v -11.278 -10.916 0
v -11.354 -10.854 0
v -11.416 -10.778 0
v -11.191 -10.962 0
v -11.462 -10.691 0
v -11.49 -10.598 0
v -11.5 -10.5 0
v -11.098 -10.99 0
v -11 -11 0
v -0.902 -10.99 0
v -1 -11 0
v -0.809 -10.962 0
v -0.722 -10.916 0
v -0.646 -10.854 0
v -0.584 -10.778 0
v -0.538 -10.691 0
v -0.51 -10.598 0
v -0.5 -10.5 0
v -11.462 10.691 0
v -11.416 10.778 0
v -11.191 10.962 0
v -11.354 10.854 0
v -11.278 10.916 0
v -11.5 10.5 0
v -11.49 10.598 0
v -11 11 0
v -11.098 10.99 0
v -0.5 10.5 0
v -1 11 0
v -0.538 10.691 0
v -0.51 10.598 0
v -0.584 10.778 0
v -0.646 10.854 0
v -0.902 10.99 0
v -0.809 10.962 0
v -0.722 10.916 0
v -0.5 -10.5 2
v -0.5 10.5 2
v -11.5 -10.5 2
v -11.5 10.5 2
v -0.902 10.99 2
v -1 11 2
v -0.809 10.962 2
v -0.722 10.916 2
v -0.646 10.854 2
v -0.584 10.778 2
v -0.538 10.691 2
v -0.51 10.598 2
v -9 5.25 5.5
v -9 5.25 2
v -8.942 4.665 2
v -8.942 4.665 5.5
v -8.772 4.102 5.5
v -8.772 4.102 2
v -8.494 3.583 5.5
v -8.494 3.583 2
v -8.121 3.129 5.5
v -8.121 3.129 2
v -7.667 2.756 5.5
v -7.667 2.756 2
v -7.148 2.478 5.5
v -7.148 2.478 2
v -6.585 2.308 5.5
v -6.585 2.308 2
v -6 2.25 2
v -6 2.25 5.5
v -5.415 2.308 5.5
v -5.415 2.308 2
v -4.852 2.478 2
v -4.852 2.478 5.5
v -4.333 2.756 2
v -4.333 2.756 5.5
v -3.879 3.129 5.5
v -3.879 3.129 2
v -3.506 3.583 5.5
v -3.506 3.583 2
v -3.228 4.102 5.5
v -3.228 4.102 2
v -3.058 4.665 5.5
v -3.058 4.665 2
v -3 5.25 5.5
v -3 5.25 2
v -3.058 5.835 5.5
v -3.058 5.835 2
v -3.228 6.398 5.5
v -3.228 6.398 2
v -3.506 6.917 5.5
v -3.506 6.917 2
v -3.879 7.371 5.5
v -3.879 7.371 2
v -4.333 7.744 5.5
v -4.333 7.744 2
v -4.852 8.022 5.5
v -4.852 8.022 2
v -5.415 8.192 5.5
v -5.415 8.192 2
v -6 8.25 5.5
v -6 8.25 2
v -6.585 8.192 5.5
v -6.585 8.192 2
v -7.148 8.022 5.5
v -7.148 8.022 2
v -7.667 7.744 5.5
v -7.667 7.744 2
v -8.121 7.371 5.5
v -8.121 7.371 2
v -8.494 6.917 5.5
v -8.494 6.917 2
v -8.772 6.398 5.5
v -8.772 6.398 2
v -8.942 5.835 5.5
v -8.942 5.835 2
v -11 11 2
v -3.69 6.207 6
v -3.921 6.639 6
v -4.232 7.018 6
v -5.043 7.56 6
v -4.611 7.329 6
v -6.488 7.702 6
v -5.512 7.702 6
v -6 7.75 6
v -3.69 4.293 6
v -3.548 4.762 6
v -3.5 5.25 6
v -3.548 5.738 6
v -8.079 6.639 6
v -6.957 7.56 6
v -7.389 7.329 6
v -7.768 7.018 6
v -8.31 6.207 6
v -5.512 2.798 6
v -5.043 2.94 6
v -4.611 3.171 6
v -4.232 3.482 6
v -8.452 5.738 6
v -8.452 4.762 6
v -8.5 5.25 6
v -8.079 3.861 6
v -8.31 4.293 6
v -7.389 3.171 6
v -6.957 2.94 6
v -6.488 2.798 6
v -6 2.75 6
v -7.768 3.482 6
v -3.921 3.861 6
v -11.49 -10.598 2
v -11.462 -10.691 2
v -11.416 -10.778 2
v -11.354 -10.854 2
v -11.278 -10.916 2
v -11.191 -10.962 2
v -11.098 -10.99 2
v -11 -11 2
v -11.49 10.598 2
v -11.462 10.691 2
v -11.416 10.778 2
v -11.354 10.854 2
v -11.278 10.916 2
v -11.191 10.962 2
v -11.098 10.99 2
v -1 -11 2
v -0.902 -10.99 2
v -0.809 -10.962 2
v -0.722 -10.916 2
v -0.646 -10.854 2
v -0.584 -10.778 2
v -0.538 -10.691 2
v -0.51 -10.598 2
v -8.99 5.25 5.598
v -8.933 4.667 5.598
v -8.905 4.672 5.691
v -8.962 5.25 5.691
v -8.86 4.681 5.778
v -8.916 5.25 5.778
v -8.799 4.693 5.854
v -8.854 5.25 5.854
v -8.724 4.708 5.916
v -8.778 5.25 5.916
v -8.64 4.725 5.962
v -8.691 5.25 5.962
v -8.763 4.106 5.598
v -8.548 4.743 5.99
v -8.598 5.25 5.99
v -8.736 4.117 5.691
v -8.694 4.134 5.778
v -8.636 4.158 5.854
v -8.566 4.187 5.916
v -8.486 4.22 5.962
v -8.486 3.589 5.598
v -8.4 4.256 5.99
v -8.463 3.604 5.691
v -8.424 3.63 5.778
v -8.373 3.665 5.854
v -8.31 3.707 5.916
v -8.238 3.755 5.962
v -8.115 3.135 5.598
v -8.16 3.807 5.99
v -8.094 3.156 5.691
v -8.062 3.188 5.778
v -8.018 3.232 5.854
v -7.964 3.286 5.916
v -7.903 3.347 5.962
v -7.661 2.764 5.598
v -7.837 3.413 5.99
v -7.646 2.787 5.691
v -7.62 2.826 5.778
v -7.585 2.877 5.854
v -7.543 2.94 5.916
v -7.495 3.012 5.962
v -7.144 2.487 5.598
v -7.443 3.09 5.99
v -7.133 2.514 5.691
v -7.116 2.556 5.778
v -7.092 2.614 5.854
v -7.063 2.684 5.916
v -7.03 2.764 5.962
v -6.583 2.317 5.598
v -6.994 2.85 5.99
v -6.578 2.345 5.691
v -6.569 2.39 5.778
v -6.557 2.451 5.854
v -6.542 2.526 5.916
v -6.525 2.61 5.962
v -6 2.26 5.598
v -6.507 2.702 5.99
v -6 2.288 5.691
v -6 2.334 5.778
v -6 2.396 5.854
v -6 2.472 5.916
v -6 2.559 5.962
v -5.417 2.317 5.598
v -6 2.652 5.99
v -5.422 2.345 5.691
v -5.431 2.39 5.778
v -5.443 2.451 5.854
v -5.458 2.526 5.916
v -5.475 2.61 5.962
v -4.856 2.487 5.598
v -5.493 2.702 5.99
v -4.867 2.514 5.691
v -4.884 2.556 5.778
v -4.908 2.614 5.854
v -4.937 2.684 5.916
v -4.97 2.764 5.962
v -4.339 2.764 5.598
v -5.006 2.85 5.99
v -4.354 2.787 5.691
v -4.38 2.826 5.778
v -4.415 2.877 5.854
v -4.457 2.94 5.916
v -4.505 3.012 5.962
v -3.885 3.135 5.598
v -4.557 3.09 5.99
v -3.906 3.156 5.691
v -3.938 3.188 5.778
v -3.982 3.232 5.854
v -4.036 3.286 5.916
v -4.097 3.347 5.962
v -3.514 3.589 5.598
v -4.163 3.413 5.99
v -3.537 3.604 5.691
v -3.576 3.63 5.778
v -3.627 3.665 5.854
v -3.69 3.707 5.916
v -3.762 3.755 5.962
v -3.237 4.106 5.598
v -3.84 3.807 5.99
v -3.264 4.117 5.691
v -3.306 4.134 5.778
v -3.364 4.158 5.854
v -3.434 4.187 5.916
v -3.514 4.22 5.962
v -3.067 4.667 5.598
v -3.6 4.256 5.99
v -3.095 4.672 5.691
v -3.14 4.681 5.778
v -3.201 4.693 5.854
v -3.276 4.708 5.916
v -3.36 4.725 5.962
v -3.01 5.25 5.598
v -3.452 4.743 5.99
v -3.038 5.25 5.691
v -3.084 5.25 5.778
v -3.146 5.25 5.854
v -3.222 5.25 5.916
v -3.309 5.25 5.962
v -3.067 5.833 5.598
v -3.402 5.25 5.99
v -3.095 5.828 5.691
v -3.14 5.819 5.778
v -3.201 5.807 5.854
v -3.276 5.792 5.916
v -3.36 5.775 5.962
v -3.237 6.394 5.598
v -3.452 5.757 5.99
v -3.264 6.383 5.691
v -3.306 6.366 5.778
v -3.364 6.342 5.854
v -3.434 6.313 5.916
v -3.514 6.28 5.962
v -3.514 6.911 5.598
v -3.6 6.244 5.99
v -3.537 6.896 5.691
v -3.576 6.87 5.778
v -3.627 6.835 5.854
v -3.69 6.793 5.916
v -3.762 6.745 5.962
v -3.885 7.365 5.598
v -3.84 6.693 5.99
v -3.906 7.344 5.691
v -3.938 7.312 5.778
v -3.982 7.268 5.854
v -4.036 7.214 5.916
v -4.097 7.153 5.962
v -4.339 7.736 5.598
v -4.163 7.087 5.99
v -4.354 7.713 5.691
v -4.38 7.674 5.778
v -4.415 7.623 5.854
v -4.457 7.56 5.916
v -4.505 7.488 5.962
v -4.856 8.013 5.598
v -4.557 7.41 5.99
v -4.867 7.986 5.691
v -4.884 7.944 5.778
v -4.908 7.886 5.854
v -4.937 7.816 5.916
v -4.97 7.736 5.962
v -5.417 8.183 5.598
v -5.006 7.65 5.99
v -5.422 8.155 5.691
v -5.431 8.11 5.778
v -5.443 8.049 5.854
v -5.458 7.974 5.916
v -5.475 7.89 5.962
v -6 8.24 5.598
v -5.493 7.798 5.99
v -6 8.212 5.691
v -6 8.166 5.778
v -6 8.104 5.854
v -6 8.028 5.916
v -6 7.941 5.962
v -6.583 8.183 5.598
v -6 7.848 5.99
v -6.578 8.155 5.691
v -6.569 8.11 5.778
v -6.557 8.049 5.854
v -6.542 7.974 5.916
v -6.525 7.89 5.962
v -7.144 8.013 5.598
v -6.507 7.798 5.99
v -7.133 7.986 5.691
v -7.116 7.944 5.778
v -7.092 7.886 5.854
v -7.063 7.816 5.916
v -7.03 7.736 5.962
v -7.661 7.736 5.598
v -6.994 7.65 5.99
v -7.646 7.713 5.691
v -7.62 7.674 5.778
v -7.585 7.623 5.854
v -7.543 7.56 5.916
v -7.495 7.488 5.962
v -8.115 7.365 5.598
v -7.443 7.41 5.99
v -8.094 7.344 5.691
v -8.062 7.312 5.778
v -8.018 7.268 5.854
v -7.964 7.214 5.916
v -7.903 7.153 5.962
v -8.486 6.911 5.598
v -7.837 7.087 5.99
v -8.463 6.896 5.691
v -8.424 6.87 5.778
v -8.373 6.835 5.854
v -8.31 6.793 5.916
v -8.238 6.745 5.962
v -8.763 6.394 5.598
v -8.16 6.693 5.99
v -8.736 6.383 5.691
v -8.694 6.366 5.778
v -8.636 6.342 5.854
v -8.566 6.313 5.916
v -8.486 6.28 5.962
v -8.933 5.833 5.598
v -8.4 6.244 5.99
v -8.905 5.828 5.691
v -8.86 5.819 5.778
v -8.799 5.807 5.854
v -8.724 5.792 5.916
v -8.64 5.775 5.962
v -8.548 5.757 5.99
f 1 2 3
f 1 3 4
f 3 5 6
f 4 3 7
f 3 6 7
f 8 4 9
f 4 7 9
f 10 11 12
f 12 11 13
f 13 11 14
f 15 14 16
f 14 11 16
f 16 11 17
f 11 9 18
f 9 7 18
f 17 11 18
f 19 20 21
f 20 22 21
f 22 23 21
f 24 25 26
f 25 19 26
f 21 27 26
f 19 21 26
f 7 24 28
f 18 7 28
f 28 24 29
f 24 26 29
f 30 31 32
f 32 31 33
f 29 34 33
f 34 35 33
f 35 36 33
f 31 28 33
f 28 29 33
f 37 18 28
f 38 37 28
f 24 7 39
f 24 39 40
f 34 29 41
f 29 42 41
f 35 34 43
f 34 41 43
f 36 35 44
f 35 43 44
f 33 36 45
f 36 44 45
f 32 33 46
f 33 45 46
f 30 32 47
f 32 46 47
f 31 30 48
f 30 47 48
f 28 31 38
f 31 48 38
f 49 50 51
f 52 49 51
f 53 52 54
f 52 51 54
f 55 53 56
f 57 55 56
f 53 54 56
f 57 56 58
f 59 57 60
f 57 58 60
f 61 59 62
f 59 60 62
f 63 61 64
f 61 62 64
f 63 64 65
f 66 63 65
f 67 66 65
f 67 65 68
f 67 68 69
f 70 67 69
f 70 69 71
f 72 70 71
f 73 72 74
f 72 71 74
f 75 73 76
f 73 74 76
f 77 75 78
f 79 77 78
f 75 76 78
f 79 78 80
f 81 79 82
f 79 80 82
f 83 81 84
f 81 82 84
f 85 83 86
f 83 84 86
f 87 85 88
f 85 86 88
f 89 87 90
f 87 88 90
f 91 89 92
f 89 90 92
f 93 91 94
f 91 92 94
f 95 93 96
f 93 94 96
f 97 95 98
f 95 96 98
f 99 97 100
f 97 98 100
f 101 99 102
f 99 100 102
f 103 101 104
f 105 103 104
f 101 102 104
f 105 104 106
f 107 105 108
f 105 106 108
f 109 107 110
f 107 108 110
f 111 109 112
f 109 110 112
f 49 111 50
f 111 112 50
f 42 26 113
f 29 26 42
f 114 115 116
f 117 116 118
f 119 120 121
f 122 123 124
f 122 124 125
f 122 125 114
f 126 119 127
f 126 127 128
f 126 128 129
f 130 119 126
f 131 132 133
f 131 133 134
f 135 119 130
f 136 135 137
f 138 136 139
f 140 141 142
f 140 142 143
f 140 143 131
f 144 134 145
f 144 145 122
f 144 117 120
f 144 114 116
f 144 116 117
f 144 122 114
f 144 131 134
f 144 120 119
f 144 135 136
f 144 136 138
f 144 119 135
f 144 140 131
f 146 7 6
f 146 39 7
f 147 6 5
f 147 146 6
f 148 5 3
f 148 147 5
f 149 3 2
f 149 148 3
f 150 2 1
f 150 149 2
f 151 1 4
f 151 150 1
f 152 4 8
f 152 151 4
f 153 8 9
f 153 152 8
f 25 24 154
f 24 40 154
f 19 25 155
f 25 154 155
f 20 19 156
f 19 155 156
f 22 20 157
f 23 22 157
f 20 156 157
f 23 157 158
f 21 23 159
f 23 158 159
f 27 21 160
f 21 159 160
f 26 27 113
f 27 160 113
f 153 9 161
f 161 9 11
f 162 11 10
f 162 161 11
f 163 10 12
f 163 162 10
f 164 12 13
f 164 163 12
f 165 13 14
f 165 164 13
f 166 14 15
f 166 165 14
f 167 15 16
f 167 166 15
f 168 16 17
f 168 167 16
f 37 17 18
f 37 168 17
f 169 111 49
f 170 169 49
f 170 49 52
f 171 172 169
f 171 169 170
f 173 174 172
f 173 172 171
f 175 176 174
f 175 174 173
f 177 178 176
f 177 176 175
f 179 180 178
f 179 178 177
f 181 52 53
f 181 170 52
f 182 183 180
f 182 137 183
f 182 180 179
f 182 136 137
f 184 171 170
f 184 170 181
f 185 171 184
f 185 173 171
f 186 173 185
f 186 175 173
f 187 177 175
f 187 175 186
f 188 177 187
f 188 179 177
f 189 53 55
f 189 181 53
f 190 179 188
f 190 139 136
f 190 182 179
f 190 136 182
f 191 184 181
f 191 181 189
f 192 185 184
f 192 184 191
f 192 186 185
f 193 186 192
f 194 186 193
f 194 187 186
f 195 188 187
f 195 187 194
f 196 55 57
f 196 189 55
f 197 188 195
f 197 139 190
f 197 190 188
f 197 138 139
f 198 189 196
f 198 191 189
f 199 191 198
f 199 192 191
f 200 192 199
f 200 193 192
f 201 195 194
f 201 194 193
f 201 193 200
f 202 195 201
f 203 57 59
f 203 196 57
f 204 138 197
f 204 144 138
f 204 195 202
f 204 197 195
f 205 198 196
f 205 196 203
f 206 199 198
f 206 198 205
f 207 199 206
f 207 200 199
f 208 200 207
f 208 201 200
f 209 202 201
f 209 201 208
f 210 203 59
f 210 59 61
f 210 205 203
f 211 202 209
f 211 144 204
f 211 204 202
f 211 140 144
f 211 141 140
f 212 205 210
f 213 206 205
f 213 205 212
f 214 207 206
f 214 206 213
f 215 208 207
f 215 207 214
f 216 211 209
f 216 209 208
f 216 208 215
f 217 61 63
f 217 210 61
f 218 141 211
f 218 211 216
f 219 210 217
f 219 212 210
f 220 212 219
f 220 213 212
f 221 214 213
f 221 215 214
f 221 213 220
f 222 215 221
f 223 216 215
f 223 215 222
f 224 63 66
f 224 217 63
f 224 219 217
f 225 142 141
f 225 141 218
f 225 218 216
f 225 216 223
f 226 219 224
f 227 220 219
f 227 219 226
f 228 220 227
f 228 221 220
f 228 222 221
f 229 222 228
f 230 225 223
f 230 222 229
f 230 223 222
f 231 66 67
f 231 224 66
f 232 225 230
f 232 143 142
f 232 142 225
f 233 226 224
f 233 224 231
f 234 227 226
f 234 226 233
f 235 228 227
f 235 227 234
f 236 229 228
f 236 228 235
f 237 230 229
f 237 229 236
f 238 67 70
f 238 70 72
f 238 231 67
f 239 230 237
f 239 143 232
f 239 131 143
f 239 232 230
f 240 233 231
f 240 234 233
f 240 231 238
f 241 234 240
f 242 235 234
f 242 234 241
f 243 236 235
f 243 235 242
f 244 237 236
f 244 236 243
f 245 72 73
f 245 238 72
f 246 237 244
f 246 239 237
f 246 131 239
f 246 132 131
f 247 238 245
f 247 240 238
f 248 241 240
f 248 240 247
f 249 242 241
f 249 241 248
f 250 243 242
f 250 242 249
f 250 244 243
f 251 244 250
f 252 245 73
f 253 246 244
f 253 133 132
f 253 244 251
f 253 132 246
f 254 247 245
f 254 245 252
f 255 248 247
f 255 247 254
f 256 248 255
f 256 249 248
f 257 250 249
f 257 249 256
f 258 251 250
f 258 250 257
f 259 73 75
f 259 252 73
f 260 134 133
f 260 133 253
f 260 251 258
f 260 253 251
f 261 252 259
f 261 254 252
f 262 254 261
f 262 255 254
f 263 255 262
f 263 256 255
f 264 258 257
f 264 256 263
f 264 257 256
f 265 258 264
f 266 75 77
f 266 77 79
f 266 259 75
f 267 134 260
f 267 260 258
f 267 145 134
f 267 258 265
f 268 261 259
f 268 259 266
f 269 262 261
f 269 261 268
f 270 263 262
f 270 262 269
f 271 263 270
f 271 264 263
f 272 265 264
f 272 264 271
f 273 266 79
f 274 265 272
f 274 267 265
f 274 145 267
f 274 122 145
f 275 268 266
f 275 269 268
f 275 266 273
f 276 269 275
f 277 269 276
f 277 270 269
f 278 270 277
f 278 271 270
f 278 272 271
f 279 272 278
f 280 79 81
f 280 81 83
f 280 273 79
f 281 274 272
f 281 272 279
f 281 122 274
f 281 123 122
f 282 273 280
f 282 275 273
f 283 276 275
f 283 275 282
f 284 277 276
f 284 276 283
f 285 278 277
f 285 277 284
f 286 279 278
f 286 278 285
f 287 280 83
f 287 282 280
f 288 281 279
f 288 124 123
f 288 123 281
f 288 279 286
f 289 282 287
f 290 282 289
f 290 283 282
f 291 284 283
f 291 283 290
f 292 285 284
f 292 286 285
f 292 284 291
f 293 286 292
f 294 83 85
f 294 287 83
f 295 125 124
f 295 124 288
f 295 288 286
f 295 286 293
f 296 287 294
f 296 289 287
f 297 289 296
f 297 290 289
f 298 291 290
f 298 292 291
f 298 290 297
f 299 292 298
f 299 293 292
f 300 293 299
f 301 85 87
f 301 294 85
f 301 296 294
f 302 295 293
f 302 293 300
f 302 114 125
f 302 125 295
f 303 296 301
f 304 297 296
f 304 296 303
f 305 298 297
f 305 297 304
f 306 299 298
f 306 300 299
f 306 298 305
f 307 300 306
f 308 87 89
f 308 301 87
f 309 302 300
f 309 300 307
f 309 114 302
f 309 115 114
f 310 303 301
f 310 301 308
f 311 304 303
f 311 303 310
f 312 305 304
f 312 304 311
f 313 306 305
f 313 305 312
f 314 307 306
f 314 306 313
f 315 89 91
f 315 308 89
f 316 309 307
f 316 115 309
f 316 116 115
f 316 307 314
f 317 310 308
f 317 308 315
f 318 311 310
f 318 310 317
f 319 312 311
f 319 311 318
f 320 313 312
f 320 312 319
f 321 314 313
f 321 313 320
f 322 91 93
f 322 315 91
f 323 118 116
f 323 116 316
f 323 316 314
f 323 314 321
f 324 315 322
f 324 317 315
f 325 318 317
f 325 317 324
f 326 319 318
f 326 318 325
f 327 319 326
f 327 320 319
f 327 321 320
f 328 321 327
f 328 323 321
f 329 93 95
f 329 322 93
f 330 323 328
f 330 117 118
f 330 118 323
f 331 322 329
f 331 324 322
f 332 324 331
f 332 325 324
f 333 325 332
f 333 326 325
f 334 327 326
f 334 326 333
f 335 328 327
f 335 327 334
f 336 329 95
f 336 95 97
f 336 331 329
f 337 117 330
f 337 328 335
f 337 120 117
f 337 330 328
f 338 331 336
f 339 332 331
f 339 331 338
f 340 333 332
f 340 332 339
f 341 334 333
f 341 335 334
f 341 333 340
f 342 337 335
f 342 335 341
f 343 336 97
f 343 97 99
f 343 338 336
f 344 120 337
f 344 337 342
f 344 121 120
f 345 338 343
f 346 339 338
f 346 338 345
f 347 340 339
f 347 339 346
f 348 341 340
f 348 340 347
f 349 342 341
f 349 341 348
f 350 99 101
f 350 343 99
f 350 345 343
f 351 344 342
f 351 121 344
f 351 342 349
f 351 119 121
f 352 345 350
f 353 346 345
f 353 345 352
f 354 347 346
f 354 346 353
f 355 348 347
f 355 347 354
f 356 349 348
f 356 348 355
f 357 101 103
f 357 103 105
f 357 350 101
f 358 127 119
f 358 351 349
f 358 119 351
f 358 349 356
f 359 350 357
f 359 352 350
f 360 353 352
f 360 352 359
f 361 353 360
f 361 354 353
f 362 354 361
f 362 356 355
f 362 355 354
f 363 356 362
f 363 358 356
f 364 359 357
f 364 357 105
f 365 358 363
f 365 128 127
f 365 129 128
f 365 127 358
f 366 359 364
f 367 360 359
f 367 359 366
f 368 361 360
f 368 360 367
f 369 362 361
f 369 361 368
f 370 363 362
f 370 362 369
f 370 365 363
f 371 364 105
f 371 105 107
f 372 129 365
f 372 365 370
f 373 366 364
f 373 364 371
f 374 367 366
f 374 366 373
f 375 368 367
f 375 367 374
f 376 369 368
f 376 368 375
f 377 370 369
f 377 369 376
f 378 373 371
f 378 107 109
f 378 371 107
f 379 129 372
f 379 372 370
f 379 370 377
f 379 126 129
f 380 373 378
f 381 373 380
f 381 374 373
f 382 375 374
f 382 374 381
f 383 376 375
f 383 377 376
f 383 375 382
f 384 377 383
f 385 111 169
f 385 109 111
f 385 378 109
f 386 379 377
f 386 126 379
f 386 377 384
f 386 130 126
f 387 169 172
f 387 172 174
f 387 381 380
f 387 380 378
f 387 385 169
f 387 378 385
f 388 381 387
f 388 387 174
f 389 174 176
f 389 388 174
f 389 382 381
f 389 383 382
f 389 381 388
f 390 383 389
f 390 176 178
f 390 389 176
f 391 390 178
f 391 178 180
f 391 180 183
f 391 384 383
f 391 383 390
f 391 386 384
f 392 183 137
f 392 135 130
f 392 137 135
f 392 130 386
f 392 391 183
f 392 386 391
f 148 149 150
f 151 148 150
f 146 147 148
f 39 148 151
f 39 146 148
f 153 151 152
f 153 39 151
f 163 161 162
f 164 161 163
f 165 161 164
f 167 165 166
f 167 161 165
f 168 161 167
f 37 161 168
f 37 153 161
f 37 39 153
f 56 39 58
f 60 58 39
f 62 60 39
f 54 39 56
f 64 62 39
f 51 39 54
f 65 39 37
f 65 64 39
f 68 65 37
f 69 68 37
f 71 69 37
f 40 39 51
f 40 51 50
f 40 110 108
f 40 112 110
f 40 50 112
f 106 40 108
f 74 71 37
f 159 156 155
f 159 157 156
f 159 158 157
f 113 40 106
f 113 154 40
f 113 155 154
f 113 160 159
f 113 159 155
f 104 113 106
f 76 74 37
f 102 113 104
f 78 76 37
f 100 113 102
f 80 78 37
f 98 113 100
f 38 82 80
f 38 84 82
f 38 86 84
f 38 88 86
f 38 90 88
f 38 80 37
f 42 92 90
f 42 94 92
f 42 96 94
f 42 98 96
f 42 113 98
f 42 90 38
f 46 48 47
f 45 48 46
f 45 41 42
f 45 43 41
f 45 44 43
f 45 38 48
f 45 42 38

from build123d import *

# Parameters (mm, degrees)
SKETCH1_W           = 11
SKETCH1_H           = 22
BOSS_EXTRUDE1_DEPTH = 2
SKETCH2_R           = 3
BOSS_EXTRUDE2_DEPTH = 4
FILLET1_R           = 0.5


with BuildPart() as part:
    # Sketch1 → Boss-Extrude1 (new body)
    with BuildSketch(Plane.XY):
        with Locations((-6, 0)):
            Rectangle(SKETCH1_W, SKETCH1_H)
    extrude(amount=BOSS_EXTRUDE1_DEPTH)

    # Sketch2 → Boss-Extrude2 (add)
    with BuildSketch(Plane.XY.offset(2)):
        with Locations(Location((-6, 5.25, 0), (0, 0, 180))):
            Circle(SKETCH2_R)
    extrude(amount=BOSS_EXTRUDE2_DEPTH)

    # Fillet1
    fillet1_edges = [part.edges().sort_by_distance(p)[0] for p in [
        (-3, 5.25, 6),
        (-11.5, 11, 1),
        (-0.5, 11, 1),
        (-0.5, -11, 1),
        (-11.5, -11, 1),
    ]]
    fillet(fillet1_edges, radius=FILLET1_R)


solid = part.part
